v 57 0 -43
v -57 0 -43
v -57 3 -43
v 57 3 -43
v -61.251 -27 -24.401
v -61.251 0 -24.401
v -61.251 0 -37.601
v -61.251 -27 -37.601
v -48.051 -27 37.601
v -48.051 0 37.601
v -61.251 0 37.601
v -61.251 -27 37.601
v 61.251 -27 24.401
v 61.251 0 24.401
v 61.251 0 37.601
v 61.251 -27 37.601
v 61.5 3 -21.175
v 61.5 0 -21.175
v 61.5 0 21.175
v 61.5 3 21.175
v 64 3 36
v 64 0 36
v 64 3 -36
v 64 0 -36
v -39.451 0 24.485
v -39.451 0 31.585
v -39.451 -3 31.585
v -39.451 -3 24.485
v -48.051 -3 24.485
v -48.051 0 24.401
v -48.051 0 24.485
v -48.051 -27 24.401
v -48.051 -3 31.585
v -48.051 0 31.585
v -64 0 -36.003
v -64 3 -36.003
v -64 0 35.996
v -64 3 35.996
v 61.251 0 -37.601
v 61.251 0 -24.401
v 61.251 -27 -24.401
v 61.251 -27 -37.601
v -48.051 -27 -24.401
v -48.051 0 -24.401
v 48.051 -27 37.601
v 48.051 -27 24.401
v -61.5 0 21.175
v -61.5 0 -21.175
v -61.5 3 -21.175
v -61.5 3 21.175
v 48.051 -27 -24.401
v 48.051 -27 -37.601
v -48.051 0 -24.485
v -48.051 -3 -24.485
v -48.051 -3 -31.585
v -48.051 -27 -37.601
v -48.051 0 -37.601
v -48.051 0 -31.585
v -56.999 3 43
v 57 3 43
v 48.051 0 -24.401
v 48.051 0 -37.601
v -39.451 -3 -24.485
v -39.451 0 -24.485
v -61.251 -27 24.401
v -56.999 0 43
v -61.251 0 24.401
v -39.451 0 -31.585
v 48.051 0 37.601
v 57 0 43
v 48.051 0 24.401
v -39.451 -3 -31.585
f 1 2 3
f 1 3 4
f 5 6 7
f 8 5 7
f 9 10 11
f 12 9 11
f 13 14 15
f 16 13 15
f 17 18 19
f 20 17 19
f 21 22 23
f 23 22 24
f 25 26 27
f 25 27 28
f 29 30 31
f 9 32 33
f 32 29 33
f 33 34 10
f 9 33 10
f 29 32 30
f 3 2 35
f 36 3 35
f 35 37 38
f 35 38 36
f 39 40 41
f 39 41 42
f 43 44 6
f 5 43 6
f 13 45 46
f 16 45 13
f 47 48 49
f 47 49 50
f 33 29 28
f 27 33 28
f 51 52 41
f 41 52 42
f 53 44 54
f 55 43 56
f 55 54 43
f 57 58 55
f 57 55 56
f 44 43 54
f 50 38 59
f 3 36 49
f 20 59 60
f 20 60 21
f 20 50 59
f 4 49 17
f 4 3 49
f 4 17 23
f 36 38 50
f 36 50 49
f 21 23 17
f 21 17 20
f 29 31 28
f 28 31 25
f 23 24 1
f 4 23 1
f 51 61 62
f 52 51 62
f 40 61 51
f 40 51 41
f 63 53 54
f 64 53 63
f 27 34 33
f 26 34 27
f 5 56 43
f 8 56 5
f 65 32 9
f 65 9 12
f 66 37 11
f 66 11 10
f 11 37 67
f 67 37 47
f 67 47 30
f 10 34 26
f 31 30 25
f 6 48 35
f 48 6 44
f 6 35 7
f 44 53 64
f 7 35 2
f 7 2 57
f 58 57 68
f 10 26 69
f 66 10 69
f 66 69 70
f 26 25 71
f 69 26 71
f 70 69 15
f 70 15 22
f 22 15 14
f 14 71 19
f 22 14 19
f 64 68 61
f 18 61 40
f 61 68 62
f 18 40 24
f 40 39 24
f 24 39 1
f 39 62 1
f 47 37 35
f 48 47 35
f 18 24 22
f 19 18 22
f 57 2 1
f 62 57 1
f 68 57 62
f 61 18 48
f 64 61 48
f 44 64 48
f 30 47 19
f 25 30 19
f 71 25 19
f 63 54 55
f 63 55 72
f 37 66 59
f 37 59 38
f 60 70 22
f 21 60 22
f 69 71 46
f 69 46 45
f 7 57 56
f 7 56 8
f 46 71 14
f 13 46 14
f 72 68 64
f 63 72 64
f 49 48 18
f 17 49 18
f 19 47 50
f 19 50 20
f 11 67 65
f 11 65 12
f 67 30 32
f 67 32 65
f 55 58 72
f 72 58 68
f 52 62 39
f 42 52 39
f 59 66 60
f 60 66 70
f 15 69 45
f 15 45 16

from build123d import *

# Parameters (mm, degrees)
SKETCH1_W               = 128
SKETCH1_H               = 86
BOSS_EXTRUDE1_DEPTH     = 3
CUT_EXTRUDE1_DEPTH      = 3
CUT_EXTRUDE2_DEPTH      = 3
CUT_EXTRUDE3_DEPTH      = 3
CUT_EXTRUDE4_DEPTH      = 3
SKETCH9_W               = 123
SKETCH9_H               = 42.35
CUT_EXTRUDE5_DEPTH      = 3
SKETCH23_W              = 13.2
SKETCH23_H              = 13.2
BOSS_EXTRUDE7_DEPTH     = 27
MIRROR2_COPY_1_SKETCH_W = 13.2
MIRROR2_COPY_1_SKETCH_H = 13.2
MIRROR2_COPY_1_DEPTH    = 27
SKETCH25_W              = 8.6
SKETCH25_H              = 7.1
BOSS_EXTRUDE8_DEPTH     = 3


with BuildPart() as part:
    # Sketch1 → Boss-Extrude1 (new body)
    with BuildSketch(Plane(origin=(0, 0, 0), x_dir=(1, 0, 0), z_dir=(0, 1, 0))):
        Rectangle(SKETCH1_W, SKETCH1_H)
    extrude(amount=BOSS_EXTRUDE1_DEPTH)

    # Sketch3 → Cut-Extrude1 (cut)
    with BuildSketch(Plane(origin=(0, 0, 0), x_dir=(-1, 0, 0), z_dir=(0, -1, 0))):
        Polygon((64, -43), (56.999376177, -43), (64, -35.995743323), align=None)
    extrude(amount=-CUT_EXTRUDE1_DEPTH, mode=Mode.SUBTRACT)

    # Sketch6 → Cut-Extrude2 (cut)
    with BuildSketch(Plane.XZ):
        Polygon((-64, -43), (-57, -43), (-64, -36.003281028), align=None)
    extrude(amount=-CUT_EXTRUDE2_DEPTH, mode=Mode.SUBTRACT)

    # Sketch7 → Cut-Extrude3 (cut)
    with BuildSketch(Plane.XZ):
        Polygon((64, 43), (57, 43), (64, 36), align=None)
    extrude(amount=-CUT_EXTRUDE3_DEPTH, mode=Mode.SUBTRACT)

    # Sketch8 → Cut-Extrude4 (cut)
    with BuildSketch(Plane.XZ):
        Polygon((64, -43), (64, -36), (57, -43), align=None)
    extrude(amount=-CUT_EXTRUDE4_DEPTH, mode=Mode.SUBTRACT)

    # Sketch9 → Cut-Extrude5 (cut)
    with BuildSketch(Plane.XZ):
        Rectangle(SKETCH9_W, SKETCH9_H)
    extrude(amount=-CUT_EXTRUDE5_DEPTH, mode=Mode.SUBTRACT)

    # Sketch23 → Boss-Extrude7 (add)
    with BuildSketch(Plane.XZ):
        with Locations((54.651250219, 31.000549)):
            Rectangle(SKETCH23_W, SKETCH23_H)
    boss_extrude7 = extrude(amount=BOSS_EXTRUDE7_DEPTH)

    # Mirror1: Boss-Extrude7 across plane
    add(boss_extrude7.mirror(Plane.XY))

    # Mirror2: Boss-Extrude7 across plane
    add(boss_extrude7.mirror(Plane(origin=(0, 0, 0), x_dir=(0, 0, 1), z_dir=(1, 0, 0))))

    # Mirror2 copy 1 sketch → Mirror2 copy 1 (add)
    with BuildSketch(Plane(origin=(0, 0, 0), x_dir=(-1, 0, 0), z_dir=(0, -1, 0))):
        with Locations((54.651250219, 31.000549)):
            Rectangle(MIRROR2_COPY_1_SKETCH_W, MIRROR2_COPY_1_SKETCH_H)
    extrude(amount=MIRROR2_COPY_1_DEPTH)

    # Sketch25 → Boss-Extrude8 (add)
    with BuildSketch(Plane.XZ):
        with Locations((-43.751250219, -28.035331383)):
            Rectangle(SKETCH25_W, SKETCH25_H)
    boss_extrude8 = extrude(amount=BOSS_EXTRUDE8_DEPTH)

    # Mirror4: Boss-Extrude8 across plane
    add(boss_extrude8.mirror(Plane.XY))


solid = part.part
